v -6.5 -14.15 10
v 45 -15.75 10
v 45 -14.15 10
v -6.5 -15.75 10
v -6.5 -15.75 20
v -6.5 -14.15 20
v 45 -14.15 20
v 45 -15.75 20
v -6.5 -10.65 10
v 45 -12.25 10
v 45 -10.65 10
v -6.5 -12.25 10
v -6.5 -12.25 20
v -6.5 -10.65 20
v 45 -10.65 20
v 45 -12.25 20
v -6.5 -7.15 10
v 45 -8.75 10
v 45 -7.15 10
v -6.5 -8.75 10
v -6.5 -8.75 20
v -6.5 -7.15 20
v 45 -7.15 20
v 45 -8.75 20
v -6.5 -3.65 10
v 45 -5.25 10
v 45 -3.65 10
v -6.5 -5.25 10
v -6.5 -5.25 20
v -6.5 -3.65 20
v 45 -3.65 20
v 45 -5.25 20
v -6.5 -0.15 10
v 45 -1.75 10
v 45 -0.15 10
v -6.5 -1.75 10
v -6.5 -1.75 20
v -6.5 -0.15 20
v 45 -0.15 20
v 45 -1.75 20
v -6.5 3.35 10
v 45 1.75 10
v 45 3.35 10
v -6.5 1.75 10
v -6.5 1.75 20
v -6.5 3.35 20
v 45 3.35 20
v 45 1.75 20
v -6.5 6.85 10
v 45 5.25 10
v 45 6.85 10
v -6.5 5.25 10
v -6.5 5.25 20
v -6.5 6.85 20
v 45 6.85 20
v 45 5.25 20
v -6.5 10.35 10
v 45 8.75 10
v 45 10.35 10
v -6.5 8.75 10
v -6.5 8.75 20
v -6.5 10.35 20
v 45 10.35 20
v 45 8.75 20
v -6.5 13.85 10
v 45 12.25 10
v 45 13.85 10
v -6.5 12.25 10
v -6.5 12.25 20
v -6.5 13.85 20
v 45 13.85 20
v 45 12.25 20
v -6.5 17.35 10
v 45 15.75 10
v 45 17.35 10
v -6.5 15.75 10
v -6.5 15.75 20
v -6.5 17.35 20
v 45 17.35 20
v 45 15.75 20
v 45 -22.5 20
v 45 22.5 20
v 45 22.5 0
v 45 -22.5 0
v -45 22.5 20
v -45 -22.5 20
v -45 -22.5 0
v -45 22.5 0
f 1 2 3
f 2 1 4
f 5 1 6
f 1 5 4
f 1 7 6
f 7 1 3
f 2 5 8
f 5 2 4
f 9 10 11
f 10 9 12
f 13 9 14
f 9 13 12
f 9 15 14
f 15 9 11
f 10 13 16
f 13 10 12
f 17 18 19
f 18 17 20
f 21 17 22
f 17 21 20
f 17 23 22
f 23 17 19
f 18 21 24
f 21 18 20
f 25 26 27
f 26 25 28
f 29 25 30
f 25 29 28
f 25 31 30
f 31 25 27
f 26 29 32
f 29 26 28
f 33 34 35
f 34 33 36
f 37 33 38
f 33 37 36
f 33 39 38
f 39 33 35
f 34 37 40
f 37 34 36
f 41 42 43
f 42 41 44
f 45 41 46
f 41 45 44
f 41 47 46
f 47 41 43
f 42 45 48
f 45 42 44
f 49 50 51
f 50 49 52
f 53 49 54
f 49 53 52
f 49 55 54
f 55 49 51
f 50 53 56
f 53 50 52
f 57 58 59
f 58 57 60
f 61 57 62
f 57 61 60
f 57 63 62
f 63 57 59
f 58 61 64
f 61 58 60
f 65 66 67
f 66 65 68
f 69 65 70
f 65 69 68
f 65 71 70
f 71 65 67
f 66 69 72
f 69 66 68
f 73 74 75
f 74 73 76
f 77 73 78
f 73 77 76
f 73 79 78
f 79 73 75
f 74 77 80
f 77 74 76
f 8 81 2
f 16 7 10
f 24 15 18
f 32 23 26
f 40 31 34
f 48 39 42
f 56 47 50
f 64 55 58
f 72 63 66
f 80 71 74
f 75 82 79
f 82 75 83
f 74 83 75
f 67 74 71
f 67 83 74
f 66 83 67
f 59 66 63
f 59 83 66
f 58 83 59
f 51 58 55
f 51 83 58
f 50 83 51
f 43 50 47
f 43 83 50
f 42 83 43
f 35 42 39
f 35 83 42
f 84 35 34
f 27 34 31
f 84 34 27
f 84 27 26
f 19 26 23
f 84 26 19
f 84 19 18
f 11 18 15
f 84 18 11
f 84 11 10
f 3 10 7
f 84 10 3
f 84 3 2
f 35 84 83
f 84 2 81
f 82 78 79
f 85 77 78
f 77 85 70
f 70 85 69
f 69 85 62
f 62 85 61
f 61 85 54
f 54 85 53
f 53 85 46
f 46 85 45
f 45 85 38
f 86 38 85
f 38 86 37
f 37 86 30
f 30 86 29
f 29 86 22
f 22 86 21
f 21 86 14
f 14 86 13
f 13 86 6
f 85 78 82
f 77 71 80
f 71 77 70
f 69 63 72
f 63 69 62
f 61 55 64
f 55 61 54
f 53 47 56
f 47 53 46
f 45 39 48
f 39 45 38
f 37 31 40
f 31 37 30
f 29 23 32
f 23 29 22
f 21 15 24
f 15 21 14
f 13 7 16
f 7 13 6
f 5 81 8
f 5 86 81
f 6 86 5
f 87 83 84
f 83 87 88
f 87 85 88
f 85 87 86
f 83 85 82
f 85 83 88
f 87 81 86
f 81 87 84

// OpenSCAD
// Microscope slide drying rack
// Print orientation: base block on XY plane, slots open upward (+Z)

// ---------------- Parameters ----------------
block_len    = 90;    // block length along X (mm)
block_wid    = 45;    // block width along Y (mm)
block_h      = 20;    // block height along Z (mm)

slot_count   = 10;    // number of slide slots
slot_len     = 77;    // slot length along X (mm)
slot_w       = 1.6;   // slot width along Y (mm)
slot_depth   = 10;    // slot depth from top face (mm)
slot_pitch   = 3.5;   // centre-to-centre slot spacing in Y (mm)

eps          = 0.5;   // overcut past faces to avoid coplanar surfaces (mm)

$fn = 64;

// ---------------- Derived ----------------
slot_group_wid = (slot_count - 1) * slot_pitch;   // span of slot centres in Y
x_start        = -(block_len / 2) + (slot_len / 2);  // slot centre X (left edge of slot at block left edge)
y_start        = -(slot_group_wid / 2);              // first slot centre Y (group centred on block)

// ---------------- Model ----------------
difference() {
    // Solid base block
    translate([-block_len / 2, -block_wid / 2, 0])
        cube([block_len, block_wid, block_h]);

    // Parallel slots running along X, open at the top
    for (i = [0 : slot_count - 1]) {
        translate([x_start, y_start + i * slot_pitch, block_h - slot_depth])
            cube([slot_len, slot_w, slot_depth + eps]);
    }
}
